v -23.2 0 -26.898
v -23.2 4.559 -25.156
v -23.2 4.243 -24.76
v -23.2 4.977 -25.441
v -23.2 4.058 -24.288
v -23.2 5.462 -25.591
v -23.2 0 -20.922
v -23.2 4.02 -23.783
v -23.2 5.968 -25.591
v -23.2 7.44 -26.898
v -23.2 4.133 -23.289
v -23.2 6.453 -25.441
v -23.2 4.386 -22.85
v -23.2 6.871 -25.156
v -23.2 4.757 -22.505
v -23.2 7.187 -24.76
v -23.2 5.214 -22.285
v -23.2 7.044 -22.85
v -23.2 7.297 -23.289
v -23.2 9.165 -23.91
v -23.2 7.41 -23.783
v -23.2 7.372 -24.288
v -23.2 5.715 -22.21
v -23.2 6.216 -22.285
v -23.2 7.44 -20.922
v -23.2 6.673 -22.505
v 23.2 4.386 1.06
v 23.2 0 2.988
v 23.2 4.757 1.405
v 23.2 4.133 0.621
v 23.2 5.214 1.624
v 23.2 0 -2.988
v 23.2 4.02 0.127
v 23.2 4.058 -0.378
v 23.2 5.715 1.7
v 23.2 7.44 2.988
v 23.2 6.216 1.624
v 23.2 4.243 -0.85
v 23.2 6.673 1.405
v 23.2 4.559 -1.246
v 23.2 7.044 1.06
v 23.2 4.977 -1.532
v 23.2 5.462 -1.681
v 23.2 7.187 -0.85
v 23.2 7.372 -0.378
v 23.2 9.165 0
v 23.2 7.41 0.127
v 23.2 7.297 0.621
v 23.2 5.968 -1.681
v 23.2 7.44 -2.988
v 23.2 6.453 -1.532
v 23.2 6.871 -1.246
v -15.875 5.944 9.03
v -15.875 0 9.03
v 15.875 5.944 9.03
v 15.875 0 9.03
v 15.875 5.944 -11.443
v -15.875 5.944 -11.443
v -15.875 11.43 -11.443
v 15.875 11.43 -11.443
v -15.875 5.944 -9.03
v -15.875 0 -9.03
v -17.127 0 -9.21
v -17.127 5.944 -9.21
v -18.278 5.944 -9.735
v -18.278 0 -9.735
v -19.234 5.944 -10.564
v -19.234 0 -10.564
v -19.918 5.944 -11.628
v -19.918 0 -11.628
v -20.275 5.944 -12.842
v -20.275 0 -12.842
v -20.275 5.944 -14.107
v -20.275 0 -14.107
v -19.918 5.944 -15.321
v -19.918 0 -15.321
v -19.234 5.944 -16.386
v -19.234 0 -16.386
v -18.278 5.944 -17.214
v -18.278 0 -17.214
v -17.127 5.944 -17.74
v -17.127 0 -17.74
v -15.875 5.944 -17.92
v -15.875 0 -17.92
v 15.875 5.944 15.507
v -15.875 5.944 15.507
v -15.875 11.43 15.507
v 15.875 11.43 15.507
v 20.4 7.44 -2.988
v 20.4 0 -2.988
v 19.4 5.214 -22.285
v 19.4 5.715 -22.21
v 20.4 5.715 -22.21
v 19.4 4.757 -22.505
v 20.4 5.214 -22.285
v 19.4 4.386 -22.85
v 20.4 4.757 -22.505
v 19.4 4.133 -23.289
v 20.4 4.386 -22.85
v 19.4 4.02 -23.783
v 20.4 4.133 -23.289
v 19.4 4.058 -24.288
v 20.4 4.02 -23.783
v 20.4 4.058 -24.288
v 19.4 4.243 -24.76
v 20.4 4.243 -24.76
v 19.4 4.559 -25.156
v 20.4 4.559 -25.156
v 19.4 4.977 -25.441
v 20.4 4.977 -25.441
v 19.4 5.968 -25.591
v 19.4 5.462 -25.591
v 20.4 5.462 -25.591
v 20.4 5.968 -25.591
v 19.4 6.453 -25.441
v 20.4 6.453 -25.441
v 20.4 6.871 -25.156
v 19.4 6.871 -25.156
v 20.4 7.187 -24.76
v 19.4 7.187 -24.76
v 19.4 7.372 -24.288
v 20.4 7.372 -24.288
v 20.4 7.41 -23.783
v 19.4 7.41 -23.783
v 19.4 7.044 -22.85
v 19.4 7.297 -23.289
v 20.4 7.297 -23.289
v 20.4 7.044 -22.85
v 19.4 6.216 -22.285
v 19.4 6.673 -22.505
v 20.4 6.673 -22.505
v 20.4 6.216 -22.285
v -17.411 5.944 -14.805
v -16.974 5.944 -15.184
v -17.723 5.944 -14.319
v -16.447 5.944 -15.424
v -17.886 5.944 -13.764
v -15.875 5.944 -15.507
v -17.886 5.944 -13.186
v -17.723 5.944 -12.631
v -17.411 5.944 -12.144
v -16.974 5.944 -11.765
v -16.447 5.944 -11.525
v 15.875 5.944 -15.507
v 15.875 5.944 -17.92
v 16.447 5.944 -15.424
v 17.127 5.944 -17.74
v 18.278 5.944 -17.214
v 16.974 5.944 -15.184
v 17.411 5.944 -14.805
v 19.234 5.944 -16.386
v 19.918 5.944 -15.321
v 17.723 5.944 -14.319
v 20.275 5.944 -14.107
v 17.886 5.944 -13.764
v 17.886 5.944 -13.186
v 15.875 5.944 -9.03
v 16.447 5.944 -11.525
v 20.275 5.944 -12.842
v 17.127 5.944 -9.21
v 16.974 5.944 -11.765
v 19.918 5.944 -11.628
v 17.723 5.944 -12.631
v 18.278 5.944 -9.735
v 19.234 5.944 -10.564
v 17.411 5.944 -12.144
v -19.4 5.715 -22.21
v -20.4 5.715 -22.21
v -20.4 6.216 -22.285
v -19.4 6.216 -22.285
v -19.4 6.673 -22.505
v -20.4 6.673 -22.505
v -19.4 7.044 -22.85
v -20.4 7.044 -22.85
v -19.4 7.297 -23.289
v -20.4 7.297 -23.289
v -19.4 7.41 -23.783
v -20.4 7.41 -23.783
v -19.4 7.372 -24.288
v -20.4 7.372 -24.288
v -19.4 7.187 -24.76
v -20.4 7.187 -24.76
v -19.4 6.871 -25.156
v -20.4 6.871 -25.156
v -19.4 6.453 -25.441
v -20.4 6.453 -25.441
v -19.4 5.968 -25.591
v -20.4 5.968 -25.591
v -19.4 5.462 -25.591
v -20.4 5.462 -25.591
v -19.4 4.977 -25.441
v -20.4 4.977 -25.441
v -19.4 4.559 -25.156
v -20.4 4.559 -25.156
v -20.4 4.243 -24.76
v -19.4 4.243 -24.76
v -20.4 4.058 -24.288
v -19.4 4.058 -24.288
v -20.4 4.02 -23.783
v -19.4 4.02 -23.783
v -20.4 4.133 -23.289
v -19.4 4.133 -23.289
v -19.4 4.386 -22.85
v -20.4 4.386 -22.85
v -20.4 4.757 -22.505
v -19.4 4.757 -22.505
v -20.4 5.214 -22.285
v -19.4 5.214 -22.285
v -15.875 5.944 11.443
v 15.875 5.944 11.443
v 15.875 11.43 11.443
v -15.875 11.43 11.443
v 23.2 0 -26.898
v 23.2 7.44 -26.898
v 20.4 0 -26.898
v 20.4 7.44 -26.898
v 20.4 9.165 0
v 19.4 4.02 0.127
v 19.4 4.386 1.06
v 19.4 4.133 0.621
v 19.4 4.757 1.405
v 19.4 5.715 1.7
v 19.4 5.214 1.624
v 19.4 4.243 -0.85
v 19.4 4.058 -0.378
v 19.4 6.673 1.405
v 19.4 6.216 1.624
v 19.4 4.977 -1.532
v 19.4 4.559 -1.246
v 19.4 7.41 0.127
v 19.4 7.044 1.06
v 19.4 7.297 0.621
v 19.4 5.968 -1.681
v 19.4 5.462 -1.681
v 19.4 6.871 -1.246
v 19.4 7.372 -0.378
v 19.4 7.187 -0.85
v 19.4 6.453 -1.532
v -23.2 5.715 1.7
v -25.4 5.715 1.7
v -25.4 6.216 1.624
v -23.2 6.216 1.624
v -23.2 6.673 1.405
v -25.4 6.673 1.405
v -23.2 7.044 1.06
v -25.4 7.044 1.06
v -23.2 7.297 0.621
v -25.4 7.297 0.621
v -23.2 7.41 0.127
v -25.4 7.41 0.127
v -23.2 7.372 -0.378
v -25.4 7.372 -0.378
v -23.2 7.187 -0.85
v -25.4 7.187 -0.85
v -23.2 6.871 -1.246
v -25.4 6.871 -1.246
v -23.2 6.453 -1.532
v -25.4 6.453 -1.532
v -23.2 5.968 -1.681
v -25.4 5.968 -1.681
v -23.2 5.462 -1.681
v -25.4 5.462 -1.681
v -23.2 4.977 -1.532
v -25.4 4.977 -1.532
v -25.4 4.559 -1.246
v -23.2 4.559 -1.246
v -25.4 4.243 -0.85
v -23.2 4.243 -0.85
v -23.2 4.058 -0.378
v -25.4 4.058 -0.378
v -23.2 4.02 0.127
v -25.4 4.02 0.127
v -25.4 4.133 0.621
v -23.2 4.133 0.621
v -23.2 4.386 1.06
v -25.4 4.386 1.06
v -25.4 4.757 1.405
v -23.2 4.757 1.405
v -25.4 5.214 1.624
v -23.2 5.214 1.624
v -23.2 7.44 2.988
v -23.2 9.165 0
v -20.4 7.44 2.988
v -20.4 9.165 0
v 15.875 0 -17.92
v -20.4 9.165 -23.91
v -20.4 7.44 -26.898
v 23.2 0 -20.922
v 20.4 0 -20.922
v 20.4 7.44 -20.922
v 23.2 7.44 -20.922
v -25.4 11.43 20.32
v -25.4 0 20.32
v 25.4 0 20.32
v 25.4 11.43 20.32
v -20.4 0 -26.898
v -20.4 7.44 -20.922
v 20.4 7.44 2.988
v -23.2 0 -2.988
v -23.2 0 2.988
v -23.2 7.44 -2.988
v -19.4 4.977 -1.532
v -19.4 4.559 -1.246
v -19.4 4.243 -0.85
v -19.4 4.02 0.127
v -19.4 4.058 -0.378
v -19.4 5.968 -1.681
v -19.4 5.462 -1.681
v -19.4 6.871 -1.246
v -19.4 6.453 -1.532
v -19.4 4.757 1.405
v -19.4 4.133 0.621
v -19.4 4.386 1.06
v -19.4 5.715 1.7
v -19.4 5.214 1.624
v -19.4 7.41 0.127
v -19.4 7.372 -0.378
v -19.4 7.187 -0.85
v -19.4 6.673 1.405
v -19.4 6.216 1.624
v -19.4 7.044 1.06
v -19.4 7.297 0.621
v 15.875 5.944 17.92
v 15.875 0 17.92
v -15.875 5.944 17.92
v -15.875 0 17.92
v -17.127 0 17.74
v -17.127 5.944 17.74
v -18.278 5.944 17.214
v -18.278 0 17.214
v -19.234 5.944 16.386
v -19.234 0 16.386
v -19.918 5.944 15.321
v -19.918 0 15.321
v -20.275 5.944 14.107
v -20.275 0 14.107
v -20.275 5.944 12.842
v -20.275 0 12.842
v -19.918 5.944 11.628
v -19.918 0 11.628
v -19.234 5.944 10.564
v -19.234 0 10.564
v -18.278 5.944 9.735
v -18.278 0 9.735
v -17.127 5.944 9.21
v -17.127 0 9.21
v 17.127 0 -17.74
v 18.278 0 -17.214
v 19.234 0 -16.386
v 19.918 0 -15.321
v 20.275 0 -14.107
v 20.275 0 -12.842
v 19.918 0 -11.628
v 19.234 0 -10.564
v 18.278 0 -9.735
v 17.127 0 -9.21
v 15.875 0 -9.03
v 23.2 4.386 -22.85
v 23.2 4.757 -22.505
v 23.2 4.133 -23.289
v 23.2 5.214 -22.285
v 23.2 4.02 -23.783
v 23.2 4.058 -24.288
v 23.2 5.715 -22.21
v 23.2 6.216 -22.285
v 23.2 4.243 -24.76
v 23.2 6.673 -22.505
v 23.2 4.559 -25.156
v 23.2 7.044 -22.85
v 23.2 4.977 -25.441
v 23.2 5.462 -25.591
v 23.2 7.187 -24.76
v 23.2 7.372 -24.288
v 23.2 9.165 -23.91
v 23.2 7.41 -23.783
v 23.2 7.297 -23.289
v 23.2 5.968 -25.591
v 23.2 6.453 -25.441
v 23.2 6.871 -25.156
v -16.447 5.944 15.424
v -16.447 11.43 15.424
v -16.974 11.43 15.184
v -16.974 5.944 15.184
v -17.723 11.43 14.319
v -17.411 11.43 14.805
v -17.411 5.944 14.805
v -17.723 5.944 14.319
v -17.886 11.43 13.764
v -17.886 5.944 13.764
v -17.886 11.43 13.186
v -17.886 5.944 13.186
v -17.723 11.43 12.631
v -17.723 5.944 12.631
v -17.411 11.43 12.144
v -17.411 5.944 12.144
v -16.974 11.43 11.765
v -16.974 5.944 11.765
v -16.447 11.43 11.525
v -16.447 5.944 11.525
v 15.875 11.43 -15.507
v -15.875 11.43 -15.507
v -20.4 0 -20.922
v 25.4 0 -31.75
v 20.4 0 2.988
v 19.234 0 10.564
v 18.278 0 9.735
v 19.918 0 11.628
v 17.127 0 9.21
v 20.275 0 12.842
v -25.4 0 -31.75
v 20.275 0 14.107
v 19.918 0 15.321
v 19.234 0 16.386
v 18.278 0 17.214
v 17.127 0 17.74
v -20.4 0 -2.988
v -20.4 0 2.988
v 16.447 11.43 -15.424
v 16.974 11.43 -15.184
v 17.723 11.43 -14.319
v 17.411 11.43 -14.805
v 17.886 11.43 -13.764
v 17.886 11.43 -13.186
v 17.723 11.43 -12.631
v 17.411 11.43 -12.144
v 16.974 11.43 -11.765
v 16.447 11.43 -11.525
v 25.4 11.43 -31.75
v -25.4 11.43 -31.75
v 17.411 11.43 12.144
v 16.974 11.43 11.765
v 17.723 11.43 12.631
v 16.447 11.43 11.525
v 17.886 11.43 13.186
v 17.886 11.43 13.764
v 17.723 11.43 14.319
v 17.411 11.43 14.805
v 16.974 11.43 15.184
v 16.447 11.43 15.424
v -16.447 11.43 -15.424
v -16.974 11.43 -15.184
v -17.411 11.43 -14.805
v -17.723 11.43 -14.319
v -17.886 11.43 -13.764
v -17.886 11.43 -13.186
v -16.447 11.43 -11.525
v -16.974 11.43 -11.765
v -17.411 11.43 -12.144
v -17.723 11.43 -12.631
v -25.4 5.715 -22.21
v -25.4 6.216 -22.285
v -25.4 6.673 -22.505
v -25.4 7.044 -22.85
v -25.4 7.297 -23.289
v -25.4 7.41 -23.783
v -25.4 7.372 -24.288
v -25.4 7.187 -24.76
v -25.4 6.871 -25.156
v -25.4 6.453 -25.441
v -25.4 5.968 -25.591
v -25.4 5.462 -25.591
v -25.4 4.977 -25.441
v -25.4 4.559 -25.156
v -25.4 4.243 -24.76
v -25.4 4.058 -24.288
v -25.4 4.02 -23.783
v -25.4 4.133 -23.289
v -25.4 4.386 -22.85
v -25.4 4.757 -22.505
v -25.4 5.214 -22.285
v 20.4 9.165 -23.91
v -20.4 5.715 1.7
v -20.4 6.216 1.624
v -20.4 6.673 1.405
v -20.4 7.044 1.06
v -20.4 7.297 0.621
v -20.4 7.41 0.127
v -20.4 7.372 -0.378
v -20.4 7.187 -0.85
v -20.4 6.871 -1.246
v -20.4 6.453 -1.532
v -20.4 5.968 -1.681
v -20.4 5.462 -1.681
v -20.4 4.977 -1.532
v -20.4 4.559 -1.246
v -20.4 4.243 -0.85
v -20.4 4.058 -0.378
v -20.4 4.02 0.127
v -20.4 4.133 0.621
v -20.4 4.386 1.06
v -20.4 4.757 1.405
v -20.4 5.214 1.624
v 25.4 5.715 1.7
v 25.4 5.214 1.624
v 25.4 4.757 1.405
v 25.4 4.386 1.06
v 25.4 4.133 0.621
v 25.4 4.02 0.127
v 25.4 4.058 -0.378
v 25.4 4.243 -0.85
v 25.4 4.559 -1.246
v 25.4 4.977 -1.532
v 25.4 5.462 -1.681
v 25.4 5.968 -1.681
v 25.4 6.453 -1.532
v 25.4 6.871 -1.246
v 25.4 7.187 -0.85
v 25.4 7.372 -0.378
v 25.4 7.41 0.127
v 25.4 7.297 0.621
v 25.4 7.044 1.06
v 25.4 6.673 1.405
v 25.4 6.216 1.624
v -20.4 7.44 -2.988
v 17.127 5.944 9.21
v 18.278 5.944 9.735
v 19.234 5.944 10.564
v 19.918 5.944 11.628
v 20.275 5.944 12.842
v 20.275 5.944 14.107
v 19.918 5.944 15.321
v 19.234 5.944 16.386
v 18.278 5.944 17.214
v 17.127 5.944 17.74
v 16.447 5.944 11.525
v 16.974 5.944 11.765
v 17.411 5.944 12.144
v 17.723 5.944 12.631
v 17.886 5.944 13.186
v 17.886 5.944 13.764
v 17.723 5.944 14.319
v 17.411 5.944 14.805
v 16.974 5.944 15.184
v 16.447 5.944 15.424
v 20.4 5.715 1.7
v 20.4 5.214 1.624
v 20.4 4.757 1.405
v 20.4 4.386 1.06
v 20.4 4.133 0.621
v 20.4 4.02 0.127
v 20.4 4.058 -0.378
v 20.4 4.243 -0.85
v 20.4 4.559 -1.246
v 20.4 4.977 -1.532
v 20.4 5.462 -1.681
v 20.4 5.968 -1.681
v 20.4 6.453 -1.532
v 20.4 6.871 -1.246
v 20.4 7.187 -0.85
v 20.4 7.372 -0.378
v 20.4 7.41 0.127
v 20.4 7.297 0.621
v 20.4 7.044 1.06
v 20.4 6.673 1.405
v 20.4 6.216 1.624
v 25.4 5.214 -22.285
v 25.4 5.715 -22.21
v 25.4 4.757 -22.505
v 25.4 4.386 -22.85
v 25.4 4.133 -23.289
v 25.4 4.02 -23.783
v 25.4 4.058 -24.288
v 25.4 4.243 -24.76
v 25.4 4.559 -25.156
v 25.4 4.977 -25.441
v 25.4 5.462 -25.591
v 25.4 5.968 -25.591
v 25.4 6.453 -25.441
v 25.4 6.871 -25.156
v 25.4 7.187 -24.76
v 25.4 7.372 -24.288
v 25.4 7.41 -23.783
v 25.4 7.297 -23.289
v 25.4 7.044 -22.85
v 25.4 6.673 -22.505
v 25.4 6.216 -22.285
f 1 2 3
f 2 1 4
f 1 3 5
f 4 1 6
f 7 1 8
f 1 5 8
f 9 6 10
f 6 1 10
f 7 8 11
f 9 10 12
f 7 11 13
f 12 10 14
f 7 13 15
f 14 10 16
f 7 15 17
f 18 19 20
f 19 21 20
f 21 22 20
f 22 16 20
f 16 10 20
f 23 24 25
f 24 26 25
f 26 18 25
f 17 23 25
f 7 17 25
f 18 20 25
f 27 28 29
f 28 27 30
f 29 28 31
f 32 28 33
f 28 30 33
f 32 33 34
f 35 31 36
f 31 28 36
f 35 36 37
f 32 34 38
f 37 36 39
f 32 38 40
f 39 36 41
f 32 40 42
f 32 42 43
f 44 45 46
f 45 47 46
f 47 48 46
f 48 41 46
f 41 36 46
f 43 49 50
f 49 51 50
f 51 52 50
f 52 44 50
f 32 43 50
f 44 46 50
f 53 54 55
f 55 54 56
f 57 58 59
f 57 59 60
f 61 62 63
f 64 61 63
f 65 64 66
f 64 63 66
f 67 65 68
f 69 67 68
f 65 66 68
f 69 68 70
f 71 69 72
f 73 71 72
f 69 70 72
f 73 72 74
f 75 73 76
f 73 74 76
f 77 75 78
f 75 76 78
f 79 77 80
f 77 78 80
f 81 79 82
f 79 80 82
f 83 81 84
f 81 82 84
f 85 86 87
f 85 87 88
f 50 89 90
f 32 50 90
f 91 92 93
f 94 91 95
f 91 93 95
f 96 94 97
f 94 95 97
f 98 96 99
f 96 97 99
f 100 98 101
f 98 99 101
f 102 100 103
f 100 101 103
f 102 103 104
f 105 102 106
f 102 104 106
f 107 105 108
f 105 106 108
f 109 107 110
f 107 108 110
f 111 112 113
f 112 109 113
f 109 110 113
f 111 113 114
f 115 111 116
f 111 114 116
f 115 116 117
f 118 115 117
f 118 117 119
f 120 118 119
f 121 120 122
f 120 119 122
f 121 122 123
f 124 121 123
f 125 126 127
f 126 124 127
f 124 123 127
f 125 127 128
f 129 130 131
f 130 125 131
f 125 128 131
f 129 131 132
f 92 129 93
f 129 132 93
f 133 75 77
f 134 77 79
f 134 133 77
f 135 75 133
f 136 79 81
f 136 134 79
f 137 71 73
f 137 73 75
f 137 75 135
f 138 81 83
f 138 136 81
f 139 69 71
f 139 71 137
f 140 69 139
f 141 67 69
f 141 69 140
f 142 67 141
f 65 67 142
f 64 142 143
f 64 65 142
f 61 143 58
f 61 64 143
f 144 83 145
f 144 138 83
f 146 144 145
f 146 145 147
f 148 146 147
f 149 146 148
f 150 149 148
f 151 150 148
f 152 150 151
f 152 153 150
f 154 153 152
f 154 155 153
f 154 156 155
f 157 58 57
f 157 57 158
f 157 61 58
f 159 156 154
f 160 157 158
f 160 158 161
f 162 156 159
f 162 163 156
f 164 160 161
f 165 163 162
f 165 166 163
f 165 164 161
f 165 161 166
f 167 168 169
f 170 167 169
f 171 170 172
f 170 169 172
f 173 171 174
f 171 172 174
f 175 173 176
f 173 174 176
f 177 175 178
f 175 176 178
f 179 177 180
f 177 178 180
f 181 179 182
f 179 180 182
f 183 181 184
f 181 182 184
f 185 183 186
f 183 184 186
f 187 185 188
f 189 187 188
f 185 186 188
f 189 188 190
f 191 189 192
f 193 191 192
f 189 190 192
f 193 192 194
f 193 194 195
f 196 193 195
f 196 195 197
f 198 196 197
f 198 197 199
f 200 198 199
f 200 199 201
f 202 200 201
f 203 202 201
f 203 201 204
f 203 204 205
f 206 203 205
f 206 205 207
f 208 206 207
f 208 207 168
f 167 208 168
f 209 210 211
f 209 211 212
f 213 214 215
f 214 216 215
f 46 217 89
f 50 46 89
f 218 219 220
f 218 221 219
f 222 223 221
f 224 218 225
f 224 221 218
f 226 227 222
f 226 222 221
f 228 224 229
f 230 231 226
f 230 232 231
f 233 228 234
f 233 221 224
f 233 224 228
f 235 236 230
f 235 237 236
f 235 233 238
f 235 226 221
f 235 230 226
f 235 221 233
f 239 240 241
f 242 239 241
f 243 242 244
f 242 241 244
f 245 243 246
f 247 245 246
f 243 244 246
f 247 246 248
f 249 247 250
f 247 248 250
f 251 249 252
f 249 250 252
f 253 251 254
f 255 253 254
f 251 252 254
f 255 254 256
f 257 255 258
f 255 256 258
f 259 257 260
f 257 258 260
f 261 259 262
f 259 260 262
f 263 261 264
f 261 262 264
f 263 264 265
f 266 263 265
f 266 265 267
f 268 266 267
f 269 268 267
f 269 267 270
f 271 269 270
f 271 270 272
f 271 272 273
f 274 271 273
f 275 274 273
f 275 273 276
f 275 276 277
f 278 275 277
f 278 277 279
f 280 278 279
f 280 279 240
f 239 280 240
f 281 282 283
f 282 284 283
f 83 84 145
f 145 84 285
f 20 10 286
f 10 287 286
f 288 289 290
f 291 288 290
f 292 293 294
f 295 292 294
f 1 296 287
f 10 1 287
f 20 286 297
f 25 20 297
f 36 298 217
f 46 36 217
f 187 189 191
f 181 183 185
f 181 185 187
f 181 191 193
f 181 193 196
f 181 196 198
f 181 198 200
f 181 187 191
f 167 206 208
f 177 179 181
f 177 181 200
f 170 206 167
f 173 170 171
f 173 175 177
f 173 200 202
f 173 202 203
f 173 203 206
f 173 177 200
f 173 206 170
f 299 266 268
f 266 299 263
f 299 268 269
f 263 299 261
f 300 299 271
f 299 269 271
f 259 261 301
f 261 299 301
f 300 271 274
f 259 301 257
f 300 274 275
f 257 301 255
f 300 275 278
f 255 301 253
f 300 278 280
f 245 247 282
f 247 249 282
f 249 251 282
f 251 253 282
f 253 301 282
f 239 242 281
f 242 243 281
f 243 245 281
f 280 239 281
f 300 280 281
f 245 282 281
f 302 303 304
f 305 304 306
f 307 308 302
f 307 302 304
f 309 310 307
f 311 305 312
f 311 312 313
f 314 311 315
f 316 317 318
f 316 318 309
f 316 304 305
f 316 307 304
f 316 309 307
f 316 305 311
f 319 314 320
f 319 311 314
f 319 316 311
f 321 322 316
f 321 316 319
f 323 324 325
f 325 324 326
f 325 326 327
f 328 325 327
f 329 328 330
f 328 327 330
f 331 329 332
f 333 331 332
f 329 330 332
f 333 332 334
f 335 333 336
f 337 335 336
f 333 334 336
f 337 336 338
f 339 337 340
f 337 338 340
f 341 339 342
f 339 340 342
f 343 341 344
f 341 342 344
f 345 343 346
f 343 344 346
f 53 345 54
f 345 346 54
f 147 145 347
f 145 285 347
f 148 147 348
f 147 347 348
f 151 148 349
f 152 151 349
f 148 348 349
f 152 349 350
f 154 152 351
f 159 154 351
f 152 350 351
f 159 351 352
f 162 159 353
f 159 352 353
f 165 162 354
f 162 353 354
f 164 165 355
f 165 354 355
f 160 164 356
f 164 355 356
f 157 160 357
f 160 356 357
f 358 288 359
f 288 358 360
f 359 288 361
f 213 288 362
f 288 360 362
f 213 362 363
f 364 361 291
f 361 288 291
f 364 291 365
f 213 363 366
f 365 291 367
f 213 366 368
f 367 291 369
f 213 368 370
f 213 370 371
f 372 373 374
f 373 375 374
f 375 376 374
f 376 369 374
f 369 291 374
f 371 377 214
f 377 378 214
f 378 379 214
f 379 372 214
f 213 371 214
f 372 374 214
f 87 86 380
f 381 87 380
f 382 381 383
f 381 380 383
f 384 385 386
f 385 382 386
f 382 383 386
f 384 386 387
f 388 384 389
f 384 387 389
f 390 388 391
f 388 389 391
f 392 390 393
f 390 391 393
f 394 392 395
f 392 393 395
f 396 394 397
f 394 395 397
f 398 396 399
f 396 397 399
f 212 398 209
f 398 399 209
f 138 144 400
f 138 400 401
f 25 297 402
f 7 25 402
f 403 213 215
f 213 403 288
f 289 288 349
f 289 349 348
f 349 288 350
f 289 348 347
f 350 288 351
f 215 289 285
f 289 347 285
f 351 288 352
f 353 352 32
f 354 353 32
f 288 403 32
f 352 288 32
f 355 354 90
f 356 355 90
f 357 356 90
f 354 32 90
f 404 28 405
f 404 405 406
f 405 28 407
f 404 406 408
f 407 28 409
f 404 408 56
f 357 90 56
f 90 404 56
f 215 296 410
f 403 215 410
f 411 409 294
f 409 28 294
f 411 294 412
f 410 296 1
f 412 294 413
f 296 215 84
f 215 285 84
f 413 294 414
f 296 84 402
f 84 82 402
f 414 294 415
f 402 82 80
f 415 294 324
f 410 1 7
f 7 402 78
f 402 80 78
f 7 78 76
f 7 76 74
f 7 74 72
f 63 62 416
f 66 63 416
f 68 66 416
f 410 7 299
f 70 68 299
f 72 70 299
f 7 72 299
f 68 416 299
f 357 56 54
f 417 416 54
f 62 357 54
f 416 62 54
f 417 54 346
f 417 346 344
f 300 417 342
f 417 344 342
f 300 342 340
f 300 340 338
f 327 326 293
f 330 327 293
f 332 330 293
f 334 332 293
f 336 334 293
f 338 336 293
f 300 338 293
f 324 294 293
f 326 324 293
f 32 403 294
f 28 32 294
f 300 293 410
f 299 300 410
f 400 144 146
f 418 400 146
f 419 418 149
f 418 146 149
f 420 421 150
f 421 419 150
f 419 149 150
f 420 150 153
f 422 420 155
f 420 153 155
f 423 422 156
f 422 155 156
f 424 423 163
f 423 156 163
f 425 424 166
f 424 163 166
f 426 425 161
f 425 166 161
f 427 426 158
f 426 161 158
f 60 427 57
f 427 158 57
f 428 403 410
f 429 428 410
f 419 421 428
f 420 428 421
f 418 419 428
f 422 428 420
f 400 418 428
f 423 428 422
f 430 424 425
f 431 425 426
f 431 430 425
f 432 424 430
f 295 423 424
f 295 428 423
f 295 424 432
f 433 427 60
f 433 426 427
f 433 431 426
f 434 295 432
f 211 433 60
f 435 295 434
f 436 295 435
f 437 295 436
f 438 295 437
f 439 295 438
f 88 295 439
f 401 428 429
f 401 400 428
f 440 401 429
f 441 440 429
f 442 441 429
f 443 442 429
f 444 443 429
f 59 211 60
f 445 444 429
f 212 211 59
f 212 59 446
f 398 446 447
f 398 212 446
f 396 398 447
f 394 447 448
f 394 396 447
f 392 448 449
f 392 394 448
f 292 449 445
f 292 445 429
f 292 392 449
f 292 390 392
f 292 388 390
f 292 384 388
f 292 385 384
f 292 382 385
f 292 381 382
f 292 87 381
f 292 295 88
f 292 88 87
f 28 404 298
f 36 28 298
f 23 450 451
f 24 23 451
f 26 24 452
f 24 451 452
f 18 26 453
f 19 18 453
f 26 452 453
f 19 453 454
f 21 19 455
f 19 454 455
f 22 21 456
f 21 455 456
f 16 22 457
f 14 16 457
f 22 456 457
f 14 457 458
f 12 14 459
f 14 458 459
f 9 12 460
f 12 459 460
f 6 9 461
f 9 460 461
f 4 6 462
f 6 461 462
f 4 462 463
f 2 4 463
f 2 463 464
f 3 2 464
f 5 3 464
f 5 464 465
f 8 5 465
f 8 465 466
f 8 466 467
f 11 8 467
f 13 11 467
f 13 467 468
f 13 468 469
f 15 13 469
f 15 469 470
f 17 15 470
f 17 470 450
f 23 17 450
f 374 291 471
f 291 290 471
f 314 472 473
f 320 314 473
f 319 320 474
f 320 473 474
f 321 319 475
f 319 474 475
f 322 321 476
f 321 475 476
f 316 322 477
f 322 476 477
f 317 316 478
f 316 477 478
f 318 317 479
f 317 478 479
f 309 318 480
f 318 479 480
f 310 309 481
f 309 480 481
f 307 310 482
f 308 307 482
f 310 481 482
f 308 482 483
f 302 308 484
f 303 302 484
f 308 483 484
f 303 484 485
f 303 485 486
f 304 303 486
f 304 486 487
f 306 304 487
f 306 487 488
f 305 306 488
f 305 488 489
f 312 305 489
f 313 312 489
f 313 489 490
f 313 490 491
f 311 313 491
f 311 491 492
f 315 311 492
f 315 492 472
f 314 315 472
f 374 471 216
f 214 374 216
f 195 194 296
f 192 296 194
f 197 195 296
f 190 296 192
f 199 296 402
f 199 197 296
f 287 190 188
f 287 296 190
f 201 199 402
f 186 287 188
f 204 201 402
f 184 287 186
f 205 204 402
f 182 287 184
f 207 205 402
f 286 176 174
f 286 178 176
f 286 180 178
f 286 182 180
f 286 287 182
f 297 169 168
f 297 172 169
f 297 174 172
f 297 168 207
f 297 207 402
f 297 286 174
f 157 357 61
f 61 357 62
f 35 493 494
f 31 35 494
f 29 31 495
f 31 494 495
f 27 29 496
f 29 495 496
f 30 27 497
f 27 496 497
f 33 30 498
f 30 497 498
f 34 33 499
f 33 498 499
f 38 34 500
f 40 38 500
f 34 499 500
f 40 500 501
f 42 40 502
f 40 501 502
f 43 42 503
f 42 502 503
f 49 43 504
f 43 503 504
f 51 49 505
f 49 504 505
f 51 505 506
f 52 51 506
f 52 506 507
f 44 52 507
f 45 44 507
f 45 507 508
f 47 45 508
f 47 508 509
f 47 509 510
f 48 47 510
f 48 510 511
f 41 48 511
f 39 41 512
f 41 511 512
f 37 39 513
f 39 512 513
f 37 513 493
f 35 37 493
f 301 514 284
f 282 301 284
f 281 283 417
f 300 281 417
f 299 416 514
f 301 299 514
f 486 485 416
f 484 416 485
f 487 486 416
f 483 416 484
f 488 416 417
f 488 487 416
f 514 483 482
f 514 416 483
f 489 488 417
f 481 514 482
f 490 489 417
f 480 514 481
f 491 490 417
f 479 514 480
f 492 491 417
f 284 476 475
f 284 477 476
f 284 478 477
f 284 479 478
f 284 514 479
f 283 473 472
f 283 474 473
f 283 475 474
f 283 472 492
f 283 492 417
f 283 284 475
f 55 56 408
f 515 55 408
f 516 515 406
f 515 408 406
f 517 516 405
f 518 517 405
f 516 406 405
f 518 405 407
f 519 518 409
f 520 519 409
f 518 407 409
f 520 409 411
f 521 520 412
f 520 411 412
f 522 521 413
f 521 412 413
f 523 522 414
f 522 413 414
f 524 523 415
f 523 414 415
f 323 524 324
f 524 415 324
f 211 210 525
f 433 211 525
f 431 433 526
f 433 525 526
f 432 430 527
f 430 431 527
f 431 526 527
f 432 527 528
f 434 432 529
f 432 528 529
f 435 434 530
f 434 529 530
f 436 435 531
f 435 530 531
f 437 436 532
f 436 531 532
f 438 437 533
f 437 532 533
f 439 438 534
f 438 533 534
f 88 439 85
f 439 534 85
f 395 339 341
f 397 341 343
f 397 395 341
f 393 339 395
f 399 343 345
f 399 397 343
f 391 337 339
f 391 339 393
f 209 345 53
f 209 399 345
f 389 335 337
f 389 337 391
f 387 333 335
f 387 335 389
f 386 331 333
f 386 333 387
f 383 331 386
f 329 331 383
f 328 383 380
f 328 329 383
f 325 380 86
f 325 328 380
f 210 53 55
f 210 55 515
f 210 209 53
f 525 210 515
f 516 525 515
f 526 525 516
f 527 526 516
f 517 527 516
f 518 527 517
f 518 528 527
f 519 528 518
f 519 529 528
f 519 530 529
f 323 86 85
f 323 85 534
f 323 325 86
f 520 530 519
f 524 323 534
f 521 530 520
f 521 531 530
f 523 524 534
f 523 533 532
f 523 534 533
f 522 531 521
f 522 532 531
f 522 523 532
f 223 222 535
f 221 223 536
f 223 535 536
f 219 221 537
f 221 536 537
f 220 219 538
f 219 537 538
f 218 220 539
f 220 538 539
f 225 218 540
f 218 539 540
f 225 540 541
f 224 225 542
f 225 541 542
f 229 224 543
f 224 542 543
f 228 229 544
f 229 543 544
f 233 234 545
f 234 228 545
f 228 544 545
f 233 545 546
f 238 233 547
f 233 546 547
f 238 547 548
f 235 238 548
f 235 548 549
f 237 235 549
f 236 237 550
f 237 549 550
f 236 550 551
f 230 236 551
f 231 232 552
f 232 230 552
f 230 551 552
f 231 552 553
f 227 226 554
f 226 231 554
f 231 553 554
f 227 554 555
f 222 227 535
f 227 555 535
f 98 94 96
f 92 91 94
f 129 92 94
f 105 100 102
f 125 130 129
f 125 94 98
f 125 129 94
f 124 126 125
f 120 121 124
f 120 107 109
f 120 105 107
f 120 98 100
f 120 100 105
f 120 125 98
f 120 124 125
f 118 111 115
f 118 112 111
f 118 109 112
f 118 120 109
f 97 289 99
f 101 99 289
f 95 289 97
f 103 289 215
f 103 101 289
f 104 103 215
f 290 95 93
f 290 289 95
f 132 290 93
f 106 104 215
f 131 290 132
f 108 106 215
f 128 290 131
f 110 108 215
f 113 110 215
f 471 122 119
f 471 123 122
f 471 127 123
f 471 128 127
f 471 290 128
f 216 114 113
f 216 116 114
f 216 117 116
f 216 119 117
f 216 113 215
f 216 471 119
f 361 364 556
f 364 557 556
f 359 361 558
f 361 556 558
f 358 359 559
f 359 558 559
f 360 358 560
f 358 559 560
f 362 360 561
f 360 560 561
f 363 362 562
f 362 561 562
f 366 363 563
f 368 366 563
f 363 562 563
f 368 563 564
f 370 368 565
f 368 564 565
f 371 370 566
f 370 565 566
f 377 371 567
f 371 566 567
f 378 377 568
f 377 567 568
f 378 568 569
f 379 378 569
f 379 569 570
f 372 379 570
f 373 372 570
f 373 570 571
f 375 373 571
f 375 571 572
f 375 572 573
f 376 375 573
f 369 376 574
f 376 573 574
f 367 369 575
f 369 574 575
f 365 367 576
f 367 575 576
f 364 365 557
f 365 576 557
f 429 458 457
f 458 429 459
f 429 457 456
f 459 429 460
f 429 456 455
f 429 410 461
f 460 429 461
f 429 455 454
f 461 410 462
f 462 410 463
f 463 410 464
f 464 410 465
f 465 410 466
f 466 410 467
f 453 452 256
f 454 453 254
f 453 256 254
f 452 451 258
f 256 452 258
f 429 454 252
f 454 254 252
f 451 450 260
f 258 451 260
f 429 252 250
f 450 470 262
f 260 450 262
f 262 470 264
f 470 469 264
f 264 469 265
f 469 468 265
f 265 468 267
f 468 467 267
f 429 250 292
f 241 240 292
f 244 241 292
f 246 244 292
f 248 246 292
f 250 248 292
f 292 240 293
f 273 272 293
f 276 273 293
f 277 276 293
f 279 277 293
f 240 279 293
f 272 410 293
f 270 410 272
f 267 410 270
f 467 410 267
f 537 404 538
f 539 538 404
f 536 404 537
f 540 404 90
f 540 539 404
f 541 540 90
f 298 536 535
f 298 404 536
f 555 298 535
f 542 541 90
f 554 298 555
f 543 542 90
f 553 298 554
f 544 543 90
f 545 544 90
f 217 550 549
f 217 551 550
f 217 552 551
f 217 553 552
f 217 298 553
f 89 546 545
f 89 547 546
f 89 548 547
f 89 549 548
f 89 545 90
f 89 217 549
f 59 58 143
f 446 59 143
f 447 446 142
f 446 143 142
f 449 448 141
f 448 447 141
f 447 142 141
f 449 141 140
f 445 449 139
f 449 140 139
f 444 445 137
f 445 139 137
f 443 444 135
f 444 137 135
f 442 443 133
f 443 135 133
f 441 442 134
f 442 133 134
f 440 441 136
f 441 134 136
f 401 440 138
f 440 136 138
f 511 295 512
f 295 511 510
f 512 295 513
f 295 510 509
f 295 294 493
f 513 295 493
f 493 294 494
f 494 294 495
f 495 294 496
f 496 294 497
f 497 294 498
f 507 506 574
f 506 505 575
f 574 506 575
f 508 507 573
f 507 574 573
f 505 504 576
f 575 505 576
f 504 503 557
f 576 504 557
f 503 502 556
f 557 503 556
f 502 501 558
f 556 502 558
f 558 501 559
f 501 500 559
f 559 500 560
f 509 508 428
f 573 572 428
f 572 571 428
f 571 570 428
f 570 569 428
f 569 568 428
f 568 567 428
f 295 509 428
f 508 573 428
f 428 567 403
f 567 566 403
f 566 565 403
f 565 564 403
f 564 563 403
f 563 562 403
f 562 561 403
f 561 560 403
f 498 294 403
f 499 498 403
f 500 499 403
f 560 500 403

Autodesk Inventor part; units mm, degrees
ref_plane "YZ Plane" through (0, 0, 0) normal (1, 0, 0) x (0, 1, 0)
ref_plane "XZ Plane" through (0, 0, 0) normal (0, 1, 0) x (-1, 0, 0)
ref_plane "XY Plane" through (0, 0, 0) normal (0, 0, 1) x (1, 0, 0)
sketch "Sketch1" plane through (0, 0, 0) normal (0, 1, 0) x (-1, 0, 0)
  line L0 (-25.4, 20.32) -> (-25.4, -31.75)
  line L1 (-25.4, -31.75) -> (25.4, -31.75)
  line L2 (25.4, -31.75) -> (25.4, 20.32)
  line L3 (25.4, 31.75) -> (-25.4, -31.75) construction
  line L4 (-25.4, 31.75) -> (25.4, -31.75) construction
  line L5 (15.875, 13.4747) -> (-15.875, 13.4747) construction
  line L6 (15.875, 15.5067) -> (-15.875, 15.5067)
  line L7 (-15.875, 11.4427) -> (15.875, 11.4427)
  arc A0 (15.875, 11.4427) -> (15.875, 15.5067) centre (15.875, 13.4747) ccw
  arc A1 (-15.875, 15.5067) -> (-15.875, 11.4427) centre (-15.875, 13.4747) ccw
  line L8 (-15.875, -13.4747) -> (15.875, -13.4747) construction
  line L9 (-15.875, -15.5067) -> (15.875, -15.5067)
  line L10 (15.875, -11.4427) -> (-15.875, -11.4427)
  arc A2 (-15.875, -11.4427) -> (-15.875, -15.5067) centre (-15.875, -13.4747) ccw
  arc A3 (15.875, -15.5067) -> (15.875, -11.4427) centre (15.875, -13.4747) ccw
  line L11 (25.4, 20.32) -> (-25.4, 20.32)
  point P0 (0, 0)
  point P1 (0, 13.4747)
  point P2 (0, -13.4747)
  dimension "d0" = 50.8
  dimension "d2" = 26.9494
  dimension "d3" = 13.4747
  dimension "d4" = 26.9494
  dimension "d6" = 9.525
  dimension "d7" = 9.525
  dimension "d10" = 4.064
  dimension "d11" = 9.525
  dimension "d12" = 4.064
  dimension "d49" = 6.8453
extrude "Extrusion1" add sketch "Sketch1" along normal blind 11.43
sketch "Sketch3" plane through (0, 0, 0) normal (0, -1, 0) x (1, 0, 0)
  arc A0 (-15.875, -11.4427) -> (-15.875, -15.5067) centre (-15.875, -13.4747) ccw projected
  arc A1 (15.875, -15.5067) -> (15.875, -11.4427) centre (15.875, -13.4747) ccw projected
  line L0 (-15.875, -13.4747) -> (15.875, -13.4747) construction
  line L1 (-15.875, -17.9197) -> (15.875, -17.9197)
  line L2 (15.875, -9.0297) -> (-15.875, -9.0297)
  arc A2 (-15.875, -9.0297) -> (-15.875, -17.9197) centre (-15.875, -13.4747) ccw
  arc A3 (15.875, -17.9197) -> (15.875, -9.0297) centre (15.875, -13.4747) ccw
  arc A4 (-15.875, 15.5067) -> (-15.875, 11.4427) centre (-15.875, 13.4747) ccw projected
  arc A5 (15.875, 11.4427) -> (15.875, 15.5067) centre (15.875, 13.4747) ccw projected
  line L3 (-15.875, 13.4747) -> (15.875, 13.4747) construction
  line L4 (-15.875, 9.0297) -> (15.875, 9.0297)
  line L5 (15.875, 17.9197) -> (-15.875, 17.9197)
  arc A6 (-15.875, 17.9197) -> (-15.875, 9.0297) centre (-15.875, 13.4747) ccw
  arc A7 (15.875, 9.0297) -> (15.875, 17.9197) centre (15.875, 13.4747) ccw
  point P0 (0, 0)
  point P1 (0, -13.4747)
  point P2 (0, 13.4747)
  dimension "d19" = 8.89
  dimension "d20" = 8.89
extrude "Extrusion3" cut sketch "Sketch3" against normal blind 5.9436
ref_plane "Work Plane2" through (-20.4, 0, -31.75) normal (-1, 0, 0) x (0, 0, 1)
sketch "Sketch5" plane through (-20.4, 0, -31.75) normal (-1, 0, 0) x (0, 0, 1)
  circle A0 centre (31.75, 5.715) radius 3.45 construction
  line L0 (52.07, 0) -> (0, 0) projected
  line L1 (52.07, 11.43) -> (0, 11.43) projected
  line L2 (0, 0) -> (0, 11.43) projected
  line L3 (28.7622, 0) -> (28.7622, 7.44)
  line L4 (28.7622, 7.44) -> (31.75, 9.165)
  line L5 (31.75, 9.165) -> (34.7378, 7.44)
  line L6 (34.7378, 7.44) -> (34.7378, 0)
  line L7 (28.7622, 0) -> (34.7378, 0)
  line L8 (13.8303, 0) -> (13.8303, 5.9436) construction
  line L9 (49.6697, 0) -> (49.6697, 5.9436) construction
  circle A1 centre (7.8403, 5.715) radius 3.45 construction
  line L10 (4.8525, 0) -> (4.8525, 7.44)
  line L11 (4.8525, 7.44) -> (7.8403, 9.165)
  line L12 (7.8403, 9.165) -> (10.8281, 7.44)
  line L13 (10.8281, 7.44) -> (10.8281, 0)
  line L14 (4.8525, 0) -> (10.8281, 0)
  circle A2 centre (7.8403, 5.715) radius 1.7
  circle A3 centre (31.75, 5.715) radius 1.7
  point P0 (31.75, 0)
  dimension "d24" = 6.9
  dimension "d26" = 5.715
  dimension "d29" = 6.9
  dimension "d31" = 5.99
  dimension "d33" = 5.715
  dimension "d37" = 3.4
  dimension "d38" = 3.4
  dimension "d48" = 31.75
extrude "Extrusion4" cut sketch "Sketch5" along normal blind 2.8 contours L0 L10 L11 L12 L13 | L0 L3 L4 L5 L6 | A2 | A3
sketch "Sketch6" plane through (-25.4, 0, -31.75) normal (-1, 0, 0) x (0, 0, 1)
  circle A0 centre (7.8403, 5.715) radius 1.7
  circle A1 centre (31.75, 5.715) radius 1.7
  line L0 (13.8303, 0) -> (13.8303, 5.9436) projected
  line L1 (63.5, 0) -> (63.5, 11.43) projected
  line L2 (49.6697, 0) -> (49.6697, 5.9436) projected
  point P0 (31.75, 0)
  dimension "d40" = 3.4
  dimension "d41" = 3.4
  dimension "d43" = 5.99
extrude "Extrusion5" cut sketch "Sketch6" against normal blind 6
ref_plane "Work Plane3" through (0, 0, -31.75) normal (-1, 0, 0) x (0, 0, 1)
mirror "Mirror1" about plane through (0, 0, -31.75) normal (-1, 0, 0) of "Extrusion4"
mirror "Mirror2" about plane through (0, 0, -31.75) normal (-1, 0, 0) of "Extrusion5"
sketch "Sketch7" plane through (0, 0, 0) normal (0, -1, 0) x (1, 0, 0)
  point P0 (0, 0)
equation "\"d3\" = 0.5 * d2"
equation "\"d4\" = d2"
equation "\"d26\" = 0.5 * d25"
equation "\"d33\" = d26"
equation "\"d43\" = d31"
equation "\"d25\" = 11.43"
properties part number "driven wheel mount to xrail"
